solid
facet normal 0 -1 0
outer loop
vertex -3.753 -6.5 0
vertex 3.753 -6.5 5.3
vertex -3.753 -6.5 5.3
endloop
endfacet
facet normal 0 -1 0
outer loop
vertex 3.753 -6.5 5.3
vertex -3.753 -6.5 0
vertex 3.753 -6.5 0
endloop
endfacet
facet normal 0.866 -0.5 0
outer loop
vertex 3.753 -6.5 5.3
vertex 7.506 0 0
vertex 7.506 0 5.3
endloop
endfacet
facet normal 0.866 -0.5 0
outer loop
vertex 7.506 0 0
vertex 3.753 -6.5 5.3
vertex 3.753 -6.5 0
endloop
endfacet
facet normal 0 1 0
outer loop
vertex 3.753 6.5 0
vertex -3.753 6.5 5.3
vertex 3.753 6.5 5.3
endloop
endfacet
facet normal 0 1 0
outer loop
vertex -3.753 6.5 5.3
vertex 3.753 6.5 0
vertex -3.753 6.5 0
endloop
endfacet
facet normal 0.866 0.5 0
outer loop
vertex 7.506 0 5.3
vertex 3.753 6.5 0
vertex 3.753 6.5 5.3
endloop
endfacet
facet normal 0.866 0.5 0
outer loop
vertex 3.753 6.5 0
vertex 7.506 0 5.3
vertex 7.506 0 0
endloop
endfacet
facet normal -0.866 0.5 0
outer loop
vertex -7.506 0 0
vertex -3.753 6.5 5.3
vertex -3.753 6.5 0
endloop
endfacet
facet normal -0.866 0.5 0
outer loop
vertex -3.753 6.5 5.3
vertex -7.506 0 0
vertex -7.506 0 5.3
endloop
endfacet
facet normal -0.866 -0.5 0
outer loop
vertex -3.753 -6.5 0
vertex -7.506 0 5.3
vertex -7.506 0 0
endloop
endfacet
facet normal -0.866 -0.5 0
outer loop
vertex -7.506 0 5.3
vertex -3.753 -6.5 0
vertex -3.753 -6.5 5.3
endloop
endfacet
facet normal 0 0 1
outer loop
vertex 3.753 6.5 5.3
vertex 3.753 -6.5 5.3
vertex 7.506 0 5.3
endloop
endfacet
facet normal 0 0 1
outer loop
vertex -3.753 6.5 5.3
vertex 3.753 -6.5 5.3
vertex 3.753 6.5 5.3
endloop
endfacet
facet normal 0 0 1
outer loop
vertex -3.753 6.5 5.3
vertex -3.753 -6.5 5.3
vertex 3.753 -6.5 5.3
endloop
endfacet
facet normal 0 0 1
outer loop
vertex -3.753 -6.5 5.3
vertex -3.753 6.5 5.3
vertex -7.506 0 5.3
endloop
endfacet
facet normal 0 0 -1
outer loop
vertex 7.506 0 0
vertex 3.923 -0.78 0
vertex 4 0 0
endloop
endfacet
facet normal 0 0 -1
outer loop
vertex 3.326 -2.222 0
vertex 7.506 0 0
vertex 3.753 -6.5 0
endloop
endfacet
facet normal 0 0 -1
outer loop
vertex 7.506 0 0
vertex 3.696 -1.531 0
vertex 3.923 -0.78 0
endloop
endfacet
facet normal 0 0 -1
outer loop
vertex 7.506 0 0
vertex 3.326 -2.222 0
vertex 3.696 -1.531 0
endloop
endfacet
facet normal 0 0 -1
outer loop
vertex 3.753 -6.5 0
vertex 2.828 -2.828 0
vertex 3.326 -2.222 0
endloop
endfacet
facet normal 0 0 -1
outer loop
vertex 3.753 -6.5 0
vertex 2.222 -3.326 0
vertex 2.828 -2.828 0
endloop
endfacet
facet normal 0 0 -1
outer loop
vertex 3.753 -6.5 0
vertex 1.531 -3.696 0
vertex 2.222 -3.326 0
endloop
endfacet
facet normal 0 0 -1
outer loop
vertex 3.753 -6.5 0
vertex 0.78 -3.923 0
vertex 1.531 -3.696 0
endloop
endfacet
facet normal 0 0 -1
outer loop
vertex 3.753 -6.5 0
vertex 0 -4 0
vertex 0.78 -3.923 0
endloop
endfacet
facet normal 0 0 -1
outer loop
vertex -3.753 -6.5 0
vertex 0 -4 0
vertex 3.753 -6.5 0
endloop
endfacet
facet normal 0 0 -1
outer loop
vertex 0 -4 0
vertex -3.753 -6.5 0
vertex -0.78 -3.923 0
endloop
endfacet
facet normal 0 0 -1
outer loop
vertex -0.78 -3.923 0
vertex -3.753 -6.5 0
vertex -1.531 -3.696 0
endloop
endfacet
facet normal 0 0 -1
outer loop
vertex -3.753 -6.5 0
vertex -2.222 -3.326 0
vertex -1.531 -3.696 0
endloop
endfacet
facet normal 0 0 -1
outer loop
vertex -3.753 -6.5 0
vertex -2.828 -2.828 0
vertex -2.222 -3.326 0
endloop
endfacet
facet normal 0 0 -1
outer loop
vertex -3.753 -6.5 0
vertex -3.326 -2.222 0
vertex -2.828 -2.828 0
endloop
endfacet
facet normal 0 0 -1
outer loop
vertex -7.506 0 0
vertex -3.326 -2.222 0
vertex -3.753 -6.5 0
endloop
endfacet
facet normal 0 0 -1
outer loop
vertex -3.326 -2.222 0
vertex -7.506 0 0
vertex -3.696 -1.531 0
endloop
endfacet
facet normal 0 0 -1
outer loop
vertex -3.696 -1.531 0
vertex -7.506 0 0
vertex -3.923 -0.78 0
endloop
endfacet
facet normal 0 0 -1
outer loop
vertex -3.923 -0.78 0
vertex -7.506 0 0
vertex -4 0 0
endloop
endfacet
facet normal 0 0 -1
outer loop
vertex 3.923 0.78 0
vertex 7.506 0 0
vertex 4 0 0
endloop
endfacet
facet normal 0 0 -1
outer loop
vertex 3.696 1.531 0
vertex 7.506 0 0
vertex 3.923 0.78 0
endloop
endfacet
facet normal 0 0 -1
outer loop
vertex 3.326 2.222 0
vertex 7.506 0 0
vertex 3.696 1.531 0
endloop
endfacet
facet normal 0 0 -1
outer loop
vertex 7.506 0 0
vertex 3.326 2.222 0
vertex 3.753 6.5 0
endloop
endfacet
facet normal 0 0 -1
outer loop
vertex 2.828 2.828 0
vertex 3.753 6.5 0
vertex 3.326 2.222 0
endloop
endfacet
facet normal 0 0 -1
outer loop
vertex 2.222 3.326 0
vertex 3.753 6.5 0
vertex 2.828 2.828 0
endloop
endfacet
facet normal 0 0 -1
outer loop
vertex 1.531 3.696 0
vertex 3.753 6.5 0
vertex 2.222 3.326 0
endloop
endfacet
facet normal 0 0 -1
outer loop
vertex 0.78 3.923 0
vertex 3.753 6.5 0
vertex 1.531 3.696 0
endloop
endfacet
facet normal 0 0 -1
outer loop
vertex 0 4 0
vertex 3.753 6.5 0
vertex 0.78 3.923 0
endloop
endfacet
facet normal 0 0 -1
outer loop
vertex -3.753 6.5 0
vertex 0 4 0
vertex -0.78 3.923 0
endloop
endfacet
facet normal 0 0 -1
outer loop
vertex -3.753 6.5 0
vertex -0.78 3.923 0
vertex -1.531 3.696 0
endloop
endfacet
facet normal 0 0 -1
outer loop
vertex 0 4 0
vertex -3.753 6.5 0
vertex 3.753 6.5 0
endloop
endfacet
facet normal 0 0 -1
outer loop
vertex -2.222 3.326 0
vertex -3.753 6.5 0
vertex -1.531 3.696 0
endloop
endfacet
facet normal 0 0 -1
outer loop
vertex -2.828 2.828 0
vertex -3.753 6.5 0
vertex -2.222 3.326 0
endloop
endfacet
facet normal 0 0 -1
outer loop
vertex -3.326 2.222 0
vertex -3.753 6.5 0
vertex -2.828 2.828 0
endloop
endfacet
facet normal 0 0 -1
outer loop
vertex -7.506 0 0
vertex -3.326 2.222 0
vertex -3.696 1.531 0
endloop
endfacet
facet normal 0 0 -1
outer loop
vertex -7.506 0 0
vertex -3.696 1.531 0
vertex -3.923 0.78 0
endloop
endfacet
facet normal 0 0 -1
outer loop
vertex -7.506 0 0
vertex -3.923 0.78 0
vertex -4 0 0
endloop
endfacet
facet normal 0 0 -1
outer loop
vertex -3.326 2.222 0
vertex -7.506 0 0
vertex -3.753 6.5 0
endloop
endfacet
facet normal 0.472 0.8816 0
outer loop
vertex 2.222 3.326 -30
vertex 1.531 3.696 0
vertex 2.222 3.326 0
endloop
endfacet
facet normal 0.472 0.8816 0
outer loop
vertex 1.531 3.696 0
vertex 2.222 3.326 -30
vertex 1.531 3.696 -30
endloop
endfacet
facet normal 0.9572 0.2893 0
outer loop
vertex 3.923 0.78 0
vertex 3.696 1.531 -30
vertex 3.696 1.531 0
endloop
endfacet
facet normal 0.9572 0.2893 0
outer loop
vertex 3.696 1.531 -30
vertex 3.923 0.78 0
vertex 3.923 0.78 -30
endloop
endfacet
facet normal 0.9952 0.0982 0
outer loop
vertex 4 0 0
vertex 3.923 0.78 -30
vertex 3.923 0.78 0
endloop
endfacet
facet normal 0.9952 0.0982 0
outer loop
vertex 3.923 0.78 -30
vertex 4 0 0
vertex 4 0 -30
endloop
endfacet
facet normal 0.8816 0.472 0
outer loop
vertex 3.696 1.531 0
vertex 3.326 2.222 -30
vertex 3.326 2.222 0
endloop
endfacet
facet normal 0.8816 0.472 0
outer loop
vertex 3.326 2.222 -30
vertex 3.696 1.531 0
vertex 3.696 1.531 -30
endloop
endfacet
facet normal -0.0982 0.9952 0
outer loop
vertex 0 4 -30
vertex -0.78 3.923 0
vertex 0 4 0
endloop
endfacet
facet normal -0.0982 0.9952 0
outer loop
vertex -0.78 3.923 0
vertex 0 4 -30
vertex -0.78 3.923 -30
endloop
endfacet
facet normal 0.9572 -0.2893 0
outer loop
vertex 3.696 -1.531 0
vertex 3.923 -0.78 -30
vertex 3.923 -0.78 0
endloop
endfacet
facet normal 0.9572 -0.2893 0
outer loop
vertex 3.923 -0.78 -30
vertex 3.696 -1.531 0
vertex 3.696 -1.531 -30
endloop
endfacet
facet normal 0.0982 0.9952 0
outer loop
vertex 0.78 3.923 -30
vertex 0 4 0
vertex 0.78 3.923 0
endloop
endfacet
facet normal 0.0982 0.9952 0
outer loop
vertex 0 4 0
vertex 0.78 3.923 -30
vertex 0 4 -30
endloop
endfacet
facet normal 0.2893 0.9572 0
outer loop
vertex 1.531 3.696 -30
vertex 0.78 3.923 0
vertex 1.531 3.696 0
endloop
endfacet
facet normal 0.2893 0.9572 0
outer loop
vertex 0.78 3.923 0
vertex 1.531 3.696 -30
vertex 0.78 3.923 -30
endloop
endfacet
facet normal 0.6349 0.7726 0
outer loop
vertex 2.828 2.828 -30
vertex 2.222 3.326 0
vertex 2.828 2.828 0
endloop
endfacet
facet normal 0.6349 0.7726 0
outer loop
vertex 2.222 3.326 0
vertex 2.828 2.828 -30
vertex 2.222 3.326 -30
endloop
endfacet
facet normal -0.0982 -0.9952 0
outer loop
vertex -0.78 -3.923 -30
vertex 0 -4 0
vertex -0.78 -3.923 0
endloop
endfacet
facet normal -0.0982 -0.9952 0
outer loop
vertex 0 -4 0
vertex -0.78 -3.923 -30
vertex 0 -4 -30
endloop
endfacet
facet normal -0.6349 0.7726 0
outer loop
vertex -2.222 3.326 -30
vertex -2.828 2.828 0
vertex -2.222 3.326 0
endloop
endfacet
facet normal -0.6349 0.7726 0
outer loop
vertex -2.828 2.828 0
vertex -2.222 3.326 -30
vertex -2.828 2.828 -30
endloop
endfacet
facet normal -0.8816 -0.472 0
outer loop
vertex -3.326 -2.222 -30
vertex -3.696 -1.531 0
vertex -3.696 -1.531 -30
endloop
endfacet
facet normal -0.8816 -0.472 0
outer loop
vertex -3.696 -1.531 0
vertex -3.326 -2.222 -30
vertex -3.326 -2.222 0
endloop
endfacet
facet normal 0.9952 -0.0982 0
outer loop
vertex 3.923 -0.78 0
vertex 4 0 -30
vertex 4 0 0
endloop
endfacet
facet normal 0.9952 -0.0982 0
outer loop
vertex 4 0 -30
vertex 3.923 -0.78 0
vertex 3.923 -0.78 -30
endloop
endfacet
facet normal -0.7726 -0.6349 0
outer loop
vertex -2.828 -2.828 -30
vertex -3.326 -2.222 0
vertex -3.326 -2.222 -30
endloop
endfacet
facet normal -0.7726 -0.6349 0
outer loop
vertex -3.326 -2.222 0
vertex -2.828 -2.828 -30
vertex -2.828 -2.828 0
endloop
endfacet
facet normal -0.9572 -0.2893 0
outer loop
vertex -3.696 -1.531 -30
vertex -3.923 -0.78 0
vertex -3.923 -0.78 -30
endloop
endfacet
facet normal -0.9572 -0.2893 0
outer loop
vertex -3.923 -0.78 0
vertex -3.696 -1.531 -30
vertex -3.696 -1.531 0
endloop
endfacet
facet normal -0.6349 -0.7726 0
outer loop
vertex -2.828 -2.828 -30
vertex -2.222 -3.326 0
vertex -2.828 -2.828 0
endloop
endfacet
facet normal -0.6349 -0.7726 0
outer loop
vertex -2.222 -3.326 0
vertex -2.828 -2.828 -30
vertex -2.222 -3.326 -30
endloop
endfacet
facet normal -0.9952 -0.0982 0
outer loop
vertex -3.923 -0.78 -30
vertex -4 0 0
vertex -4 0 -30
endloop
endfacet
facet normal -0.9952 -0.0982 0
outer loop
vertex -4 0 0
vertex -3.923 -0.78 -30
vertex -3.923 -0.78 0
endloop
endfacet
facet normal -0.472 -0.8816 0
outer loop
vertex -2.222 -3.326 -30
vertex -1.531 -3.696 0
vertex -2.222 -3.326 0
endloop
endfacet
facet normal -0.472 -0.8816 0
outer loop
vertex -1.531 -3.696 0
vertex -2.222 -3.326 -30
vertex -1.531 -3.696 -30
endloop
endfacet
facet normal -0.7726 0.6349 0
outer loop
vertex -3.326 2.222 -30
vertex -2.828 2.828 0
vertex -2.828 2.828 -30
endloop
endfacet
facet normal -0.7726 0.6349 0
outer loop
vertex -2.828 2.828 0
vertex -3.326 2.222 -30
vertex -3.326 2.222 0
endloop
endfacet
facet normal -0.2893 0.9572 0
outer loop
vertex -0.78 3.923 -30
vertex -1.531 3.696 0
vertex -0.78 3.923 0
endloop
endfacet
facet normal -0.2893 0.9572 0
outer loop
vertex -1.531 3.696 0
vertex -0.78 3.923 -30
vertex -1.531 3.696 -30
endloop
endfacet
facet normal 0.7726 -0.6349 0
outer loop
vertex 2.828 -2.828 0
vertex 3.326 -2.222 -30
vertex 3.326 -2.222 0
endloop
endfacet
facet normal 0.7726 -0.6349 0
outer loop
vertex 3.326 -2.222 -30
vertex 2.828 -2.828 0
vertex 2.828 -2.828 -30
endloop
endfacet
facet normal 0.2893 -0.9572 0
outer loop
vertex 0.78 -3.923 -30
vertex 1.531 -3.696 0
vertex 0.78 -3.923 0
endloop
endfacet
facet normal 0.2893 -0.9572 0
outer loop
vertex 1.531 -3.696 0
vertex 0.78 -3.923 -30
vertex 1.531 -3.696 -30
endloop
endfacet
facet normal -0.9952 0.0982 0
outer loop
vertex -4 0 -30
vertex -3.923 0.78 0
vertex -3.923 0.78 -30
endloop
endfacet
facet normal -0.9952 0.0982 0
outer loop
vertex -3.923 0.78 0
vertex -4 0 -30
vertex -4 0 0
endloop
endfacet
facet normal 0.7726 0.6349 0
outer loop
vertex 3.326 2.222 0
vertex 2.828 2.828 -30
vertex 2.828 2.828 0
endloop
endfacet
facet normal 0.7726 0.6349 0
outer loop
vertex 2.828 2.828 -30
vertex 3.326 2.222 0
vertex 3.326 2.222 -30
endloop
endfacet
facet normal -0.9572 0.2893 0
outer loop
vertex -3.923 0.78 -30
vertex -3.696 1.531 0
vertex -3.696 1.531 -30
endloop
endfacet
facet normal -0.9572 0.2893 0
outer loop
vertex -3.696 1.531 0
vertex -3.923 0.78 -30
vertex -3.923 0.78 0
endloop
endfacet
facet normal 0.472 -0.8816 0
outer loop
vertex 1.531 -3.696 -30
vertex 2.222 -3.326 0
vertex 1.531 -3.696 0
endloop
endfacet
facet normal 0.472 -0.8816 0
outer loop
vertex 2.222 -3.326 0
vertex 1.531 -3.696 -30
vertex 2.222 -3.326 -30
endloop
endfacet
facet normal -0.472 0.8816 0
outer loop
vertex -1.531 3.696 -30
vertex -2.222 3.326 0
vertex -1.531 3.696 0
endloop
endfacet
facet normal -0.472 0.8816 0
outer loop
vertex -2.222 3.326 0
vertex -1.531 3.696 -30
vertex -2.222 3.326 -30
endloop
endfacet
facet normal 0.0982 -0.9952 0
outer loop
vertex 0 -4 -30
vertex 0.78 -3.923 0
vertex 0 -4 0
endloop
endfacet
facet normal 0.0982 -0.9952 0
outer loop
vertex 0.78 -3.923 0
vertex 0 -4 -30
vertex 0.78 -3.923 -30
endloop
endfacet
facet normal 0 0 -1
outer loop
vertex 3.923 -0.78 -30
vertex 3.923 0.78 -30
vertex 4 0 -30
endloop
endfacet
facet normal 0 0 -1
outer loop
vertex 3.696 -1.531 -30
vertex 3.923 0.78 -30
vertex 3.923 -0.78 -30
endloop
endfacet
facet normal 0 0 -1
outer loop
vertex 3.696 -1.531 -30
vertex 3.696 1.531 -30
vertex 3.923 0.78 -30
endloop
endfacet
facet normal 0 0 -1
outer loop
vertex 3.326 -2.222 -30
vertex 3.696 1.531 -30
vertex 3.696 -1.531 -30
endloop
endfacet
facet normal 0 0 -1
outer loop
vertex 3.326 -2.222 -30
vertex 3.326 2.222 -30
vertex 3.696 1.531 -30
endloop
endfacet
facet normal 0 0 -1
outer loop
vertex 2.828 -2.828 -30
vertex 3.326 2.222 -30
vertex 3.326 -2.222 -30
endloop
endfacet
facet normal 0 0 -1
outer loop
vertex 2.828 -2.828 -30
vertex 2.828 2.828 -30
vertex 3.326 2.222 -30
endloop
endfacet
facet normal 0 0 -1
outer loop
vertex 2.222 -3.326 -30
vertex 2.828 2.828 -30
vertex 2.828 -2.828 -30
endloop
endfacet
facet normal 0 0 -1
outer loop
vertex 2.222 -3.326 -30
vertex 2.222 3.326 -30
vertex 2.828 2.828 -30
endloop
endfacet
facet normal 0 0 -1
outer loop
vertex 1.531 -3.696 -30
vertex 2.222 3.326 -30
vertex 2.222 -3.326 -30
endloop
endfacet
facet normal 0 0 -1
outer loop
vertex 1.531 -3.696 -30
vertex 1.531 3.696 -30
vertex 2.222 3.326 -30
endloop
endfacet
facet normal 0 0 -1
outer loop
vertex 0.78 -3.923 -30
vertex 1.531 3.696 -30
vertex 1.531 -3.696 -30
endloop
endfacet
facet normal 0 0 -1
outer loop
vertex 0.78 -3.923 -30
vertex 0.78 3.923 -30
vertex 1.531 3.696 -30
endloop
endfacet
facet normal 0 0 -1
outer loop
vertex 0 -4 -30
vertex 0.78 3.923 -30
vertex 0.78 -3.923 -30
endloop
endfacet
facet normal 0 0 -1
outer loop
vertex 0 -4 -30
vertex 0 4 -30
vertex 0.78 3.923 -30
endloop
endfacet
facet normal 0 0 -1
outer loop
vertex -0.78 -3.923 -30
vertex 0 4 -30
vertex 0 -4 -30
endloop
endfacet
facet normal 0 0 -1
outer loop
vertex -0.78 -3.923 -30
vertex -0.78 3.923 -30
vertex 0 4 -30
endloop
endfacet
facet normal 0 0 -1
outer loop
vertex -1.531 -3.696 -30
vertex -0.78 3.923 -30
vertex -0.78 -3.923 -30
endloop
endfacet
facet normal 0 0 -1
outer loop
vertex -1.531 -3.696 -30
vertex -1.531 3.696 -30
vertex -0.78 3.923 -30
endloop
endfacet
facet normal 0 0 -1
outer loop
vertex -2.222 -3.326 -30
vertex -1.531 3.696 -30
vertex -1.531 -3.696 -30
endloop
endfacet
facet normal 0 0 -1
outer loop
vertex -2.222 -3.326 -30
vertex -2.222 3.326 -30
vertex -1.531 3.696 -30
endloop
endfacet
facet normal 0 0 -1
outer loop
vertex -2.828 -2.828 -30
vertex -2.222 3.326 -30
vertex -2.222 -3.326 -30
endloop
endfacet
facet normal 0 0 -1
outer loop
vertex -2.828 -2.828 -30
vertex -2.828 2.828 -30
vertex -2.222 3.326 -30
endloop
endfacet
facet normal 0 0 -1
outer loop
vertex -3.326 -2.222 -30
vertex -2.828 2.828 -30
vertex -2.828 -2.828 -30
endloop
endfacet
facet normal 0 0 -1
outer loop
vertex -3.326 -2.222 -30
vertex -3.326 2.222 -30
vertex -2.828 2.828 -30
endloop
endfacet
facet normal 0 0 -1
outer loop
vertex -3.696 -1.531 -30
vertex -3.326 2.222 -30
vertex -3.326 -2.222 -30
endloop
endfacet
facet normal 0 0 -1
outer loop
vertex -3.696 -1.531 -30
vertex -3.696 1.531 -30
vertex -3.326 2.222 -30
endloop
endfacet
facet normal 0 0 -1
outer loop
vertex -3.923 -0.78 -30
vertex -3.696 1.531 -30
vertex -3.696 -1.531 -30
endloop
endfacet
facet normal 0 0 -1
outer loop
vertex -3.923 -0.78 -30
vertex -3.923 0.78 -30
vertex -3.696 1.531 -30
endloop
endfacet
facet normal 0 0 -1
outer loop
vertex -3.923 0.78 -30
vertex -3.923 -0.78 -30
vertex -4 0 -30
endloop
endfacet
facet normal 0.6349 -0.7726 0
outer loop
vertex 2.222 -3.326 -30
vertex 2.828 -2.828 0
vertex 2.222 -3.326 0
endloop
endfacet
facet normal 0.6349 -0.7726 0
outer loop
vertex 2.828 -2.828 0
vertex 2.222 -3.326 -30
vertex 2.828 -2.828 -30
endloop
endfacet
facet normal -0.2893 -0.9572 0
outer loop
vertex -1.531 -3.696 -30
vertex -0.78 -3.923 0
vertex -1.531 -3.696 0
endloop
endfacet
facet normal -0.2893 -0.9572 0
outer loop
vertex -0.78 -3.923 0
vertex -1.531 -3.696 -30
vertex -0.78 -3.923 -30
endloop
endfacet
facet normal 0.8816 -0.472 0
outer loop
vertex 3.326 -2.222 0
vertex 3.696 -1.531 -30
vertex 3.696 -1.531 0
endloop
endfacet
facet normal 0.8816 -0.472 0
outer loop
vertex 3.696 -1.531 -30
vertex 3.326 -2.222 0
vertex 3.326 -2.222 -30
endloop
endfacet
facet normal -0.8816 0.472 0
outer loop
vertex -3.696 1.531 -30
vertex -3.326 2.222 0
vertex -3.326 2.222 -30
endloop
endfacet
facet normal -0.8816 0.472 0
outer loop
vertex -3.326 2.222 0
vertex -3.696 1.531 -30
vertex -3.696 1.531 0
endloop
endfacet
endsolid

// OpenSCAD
module hex_bolt_m8() {
    // 六角形の対辺距離 13mm から、外接円の半径を計算
    // 対辺距離 = sqrt(3) * 外接円半径
    // 外接円半径 = 対辺距離 / sqrt(3)
    hex_radius = 13 / sqrt(3);
    
    // 頭部：六角柱
    cylinder(h = 5.3, r = hex_radius, $fn = 6);
    
    // シャンク：円柱（z < 0 側へ伸ばす）
    translate([0, 0, -30])
        cylinder(h = 30, r = 8/2, $fn = 32);
}

hex_bolt_m8();
